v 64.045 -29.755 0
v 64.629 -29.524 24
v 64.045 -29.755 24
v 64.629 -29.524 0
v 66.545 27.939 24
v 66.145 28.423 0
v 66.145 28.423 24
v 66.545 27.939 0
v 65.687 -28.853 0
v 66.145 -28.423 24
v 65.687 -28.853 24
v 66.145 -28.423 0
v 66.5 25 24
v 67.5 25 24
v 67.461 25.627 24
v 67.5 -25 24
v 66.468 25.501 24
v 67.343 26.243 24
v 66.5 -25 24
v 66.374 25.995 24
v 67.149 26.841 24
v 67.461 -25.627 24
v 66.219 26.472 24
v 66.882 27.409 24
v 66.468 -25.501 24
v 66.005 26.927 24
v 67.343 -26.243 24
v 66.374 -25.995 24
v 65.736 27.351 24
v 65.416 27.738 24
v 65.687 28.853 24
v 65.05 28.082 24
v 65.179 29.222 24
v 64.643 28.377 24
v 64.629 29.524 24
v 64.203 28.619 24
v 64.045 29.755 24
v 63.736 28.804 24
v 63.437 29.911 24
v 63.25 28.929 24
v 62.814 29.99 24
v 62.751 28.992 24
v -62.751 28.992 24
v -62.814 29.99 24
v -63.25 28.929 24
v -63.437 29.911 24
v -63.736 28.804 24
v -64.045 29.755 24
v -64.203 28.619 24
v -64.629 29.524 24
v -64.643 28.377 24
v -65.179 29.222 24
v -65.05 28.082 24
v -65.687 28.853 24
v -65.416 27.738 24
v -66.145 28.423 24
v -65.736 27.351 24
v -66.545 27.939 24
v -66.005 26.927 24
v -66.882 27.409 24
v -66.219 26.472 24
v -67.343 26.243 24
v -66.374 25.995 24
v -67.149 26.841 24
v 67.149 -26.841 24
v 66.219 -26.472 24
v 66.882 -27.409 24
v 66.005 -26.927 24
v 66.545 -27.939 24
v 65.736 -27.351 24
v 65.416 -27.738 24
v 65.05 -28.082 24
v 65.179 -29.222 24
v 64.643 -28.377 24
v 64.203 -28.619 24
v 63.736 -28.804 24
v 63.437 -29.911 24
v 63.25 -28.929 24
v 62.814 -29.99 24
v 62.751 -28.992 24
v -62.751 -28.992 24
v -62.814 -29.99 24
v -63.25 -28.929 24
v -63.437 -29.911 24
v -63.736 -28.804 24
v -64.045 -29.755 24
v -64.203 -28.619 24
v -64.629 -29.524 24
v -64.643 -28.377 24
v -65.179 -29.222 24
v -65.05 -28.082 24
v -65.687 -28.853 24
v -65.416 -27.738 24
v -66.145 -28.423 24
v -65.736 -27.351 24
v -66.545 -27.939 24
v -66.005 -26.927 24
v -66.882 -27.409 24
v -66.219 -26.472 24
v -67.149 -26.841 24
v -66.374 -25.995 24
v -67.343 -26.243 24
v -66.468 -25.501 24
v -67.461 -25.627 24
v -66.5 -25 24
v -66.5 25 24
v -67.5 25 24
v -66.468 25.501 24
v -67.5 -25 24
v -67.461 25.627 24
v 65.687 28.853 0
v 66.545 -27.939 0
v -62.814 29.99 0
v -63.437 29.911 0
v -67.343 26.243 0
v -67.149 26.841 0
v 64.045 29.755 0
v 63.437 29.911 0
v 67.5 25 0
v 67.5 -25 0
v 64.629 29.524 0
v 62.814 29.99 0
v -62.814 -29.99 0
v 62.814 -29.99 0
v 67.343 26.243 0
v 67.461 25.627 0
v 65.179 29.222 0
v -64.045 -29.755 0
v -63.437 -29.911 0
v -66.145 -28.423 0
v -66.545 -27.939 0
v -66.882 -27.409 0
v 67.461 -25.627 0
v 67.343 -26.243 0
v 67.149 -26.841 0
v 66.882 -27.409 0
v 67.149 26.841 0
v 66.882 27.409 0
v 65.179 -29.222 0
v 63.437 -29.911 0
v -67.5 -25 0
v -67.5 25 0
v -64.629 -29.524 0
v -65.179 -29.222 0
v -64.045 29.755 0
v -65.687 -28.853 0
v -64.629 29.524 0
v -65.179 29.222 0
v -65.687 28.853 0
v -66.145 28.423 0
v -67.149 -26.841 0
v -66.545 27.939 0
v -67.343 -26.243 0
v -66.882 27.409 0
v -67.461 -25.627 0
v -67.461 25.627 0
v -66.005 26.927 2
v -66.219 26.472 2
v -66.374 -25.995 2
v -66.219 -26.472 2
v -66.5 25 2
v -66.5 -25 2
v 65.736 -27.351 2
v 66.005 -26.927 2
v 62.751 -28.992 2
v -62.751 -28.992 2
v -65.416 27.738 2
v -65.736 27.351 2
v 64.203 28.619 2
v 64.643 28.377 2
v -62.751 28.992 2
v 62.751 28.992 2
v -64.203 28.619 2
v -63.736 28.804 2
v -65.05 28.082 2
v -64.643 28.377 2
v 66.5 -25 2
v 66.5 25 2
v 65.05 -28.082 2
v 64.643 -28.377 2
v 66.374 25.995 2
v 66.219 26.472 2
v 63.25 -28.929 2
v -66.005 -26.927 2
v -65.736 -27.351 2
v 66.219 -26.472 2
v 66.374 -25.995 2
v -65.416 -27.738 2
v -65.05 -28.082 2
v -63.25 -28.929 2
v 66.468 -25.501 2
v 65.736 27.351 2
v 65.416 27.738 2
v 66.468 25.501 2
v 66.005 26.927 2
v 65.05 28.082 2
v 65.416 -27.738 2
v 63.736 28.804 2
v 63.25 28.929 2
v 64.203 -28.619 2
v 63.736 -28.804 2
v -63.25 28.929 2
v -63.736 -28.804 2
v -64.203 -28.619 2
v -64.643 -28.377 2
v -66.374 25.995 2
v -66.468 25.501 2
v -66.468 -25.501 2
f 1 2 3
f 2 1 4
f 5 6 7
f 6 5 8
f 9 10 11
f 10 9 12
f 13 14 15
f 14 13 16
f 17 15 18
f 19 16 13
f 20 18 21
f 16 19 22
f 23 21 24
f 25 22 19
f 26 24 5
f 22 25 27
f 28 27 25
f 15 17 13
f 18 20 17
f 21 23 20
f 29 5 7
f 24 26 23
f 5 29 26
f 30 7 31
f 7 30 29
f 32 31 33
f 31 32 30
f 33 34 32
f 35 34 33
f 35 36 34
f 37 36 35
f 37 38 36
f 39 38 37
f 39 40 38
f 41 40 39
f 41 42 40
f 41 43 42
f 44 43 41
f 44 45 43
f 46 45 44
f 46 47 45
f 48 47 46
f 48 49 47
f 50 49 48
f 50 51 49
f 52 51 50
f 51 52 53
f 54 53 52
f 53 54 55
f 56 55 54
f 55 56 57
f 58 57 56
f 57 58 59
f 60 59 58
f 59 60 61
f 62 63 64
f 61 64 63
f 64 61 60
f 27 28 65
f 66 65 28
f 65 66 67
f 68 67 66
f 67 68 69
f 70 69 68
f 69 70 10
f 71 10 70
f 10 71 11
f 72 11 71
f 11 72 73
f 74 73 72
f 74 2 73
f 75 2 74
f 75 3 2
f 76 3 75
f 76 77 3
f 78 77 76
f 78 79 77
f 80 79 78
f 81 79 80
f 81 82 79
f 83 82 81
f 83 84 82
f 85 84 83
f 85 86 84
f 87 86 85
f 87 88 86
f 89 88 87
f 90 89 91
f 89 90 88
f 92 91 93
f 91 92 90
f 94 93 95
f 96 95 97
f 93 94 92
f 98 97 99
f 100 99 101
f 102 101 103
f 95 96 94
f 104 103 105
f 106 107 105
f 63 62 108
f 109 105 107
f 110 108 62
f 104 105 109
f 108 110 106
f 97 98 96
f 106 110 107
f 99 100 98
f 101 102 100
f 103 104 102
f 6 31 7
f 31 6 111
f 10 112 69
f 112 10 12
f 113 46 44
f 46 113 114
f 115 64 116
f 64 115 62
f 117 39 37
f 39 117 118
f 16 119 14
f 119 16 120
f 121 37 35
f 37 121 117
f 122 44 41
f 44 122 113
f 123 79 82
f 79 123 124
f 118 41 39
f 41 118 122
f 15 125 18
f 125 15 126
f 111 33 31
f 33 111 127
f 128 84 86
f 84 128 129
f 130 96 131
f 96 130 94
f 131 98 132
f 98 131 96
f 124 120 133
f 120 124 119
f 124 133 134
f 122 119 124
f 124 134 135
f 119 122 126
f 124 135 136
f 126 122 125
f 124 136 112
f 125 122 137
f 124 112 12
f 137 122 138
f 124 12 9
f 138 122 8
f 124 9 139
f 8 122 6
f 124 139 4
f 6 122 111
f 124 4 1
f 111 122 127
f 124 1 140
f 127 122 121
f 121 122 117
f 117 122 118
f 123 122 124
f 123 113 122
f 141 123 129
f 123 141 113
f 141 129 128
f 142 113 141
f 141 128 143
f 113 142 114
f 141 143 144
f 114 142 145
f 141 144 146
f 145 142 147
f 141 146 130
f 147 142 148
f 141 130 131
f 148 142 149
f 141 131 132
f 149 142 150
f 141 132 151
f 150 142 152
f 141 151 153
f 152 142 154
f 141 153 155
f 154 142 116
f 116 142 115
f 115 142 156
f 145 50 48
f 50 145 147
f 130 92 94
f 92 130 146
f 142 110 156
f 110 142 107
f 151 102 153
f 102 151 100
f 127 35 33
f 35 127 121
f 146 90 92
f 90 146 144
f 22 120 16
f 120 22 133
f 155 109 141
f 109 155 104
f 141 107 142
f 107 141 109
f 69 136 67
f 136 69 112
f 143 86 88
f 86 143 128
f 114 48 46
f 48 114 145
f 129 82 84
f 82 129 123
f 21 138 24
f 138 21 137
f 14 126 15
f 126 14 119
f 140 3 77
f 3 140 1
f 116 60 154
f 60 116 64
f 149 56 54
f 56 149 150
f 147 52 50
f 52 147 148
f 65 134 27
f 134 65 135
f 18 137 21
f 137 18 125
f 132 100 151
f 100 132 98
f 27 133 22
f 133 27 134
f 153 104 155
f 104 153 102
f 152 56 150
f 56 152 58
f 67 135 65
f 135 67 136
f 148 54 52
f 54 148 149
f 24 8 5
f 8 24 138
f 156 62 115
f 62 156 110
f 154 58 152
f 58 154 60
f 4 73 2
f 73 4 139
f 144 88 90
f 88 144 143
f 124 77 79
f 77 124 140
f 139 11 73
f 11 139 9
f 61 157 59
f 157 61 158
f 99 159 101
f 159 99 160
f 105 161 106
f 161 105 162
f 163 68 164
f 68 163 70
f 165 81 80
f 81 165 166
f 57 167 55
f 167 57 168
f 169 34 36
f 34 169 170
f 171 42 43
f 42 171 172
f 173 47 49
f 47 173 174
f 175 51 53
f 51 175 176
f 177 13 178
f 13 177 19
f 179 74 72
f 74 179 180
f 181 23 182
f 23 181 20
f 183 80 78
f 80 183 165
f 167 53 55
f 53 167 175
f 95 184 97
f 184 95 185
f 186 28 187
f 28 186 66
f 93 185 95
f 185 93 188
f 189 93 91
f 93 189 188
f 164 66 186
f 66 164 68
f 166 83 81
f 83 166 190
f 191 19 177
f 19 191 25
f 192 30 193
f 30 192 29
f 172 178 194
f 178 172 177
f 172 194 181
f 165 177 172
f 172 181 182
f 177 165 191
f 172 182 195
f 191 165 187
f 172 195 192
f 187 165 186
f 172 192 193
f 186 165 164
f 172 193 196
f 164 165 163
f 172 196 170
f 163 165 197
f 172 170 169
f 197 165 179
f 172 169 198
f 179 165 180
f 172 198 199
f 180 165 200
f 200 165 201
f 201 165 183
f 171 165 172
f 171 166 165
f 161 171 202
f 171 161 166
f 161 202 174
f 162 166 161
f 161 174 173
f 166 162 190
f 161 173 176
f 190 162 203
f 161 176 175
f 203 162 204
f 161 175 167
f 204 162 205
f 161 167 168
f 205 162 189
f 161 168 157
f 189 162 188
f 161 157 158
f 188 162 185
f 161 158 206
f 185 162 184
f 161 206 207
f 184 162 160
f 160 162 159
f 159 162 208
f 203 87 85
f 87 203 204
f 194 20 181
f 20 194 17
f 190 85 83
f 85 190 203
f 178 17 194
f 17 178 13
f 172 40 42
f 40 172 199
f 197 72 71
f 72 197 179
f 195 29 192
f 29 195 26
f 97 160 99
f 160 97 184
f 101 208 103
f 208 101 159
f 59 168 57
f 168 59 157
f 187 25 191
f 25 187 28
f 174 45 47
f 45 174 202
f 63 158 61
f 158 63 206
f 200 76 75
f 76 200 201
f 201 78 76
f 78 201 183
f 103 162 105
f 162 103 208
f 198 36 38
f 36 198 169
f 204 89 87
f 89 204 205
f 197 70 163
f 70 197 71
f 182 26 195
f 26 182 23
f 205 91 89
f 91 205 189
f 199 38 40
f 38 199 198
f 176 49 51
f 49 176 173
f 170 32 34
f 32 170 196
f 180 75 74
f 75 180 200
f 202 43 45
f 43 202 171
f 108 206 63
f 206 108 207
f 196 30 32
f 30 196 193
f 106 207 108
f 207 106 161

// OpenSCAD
$fn = 50;


difference() {
	union() {
		hull() {
			translate(v = [-62.5000000000, 25.0000000000, 0]) {
				cylinder(h = 24, r = 5);
			}
			translate(v = [62.5000000000, 25.0000000000, 0]) {
				cylinder(h = 24, r = 5);
			}
			translate(v = [-62.5000000000, -25.0000000000, 0]) {
				cylinder(h = 24, r = 5);
			}
			translate(v = [62.5000000000, -25.0000000000, 0]) {
				cylinder(h = 24, r = 5);
			}
		}
	}
	union() {
		translate(v = [0, 0, 2]) {
			hull() {
				translate(v = [-62.5000000000, 25.0000000000, 0]) {
					cylinder(h = 22, r = 4);
				}
				translate(v = [62.5000000000, 25.0000000000, 0]) {
					cylinder(h = 22, r = 4);
				}
				translate(v = [-62.5000000000, -25.0000000000, 0]) {
					cylinder(h = 22, r = 4);
				}
				translate(v = [62.5000000000, -25.0000000000, 0]) {
					cylinder(h = 22, r = 4);
				}
			}
		}
	}
}
